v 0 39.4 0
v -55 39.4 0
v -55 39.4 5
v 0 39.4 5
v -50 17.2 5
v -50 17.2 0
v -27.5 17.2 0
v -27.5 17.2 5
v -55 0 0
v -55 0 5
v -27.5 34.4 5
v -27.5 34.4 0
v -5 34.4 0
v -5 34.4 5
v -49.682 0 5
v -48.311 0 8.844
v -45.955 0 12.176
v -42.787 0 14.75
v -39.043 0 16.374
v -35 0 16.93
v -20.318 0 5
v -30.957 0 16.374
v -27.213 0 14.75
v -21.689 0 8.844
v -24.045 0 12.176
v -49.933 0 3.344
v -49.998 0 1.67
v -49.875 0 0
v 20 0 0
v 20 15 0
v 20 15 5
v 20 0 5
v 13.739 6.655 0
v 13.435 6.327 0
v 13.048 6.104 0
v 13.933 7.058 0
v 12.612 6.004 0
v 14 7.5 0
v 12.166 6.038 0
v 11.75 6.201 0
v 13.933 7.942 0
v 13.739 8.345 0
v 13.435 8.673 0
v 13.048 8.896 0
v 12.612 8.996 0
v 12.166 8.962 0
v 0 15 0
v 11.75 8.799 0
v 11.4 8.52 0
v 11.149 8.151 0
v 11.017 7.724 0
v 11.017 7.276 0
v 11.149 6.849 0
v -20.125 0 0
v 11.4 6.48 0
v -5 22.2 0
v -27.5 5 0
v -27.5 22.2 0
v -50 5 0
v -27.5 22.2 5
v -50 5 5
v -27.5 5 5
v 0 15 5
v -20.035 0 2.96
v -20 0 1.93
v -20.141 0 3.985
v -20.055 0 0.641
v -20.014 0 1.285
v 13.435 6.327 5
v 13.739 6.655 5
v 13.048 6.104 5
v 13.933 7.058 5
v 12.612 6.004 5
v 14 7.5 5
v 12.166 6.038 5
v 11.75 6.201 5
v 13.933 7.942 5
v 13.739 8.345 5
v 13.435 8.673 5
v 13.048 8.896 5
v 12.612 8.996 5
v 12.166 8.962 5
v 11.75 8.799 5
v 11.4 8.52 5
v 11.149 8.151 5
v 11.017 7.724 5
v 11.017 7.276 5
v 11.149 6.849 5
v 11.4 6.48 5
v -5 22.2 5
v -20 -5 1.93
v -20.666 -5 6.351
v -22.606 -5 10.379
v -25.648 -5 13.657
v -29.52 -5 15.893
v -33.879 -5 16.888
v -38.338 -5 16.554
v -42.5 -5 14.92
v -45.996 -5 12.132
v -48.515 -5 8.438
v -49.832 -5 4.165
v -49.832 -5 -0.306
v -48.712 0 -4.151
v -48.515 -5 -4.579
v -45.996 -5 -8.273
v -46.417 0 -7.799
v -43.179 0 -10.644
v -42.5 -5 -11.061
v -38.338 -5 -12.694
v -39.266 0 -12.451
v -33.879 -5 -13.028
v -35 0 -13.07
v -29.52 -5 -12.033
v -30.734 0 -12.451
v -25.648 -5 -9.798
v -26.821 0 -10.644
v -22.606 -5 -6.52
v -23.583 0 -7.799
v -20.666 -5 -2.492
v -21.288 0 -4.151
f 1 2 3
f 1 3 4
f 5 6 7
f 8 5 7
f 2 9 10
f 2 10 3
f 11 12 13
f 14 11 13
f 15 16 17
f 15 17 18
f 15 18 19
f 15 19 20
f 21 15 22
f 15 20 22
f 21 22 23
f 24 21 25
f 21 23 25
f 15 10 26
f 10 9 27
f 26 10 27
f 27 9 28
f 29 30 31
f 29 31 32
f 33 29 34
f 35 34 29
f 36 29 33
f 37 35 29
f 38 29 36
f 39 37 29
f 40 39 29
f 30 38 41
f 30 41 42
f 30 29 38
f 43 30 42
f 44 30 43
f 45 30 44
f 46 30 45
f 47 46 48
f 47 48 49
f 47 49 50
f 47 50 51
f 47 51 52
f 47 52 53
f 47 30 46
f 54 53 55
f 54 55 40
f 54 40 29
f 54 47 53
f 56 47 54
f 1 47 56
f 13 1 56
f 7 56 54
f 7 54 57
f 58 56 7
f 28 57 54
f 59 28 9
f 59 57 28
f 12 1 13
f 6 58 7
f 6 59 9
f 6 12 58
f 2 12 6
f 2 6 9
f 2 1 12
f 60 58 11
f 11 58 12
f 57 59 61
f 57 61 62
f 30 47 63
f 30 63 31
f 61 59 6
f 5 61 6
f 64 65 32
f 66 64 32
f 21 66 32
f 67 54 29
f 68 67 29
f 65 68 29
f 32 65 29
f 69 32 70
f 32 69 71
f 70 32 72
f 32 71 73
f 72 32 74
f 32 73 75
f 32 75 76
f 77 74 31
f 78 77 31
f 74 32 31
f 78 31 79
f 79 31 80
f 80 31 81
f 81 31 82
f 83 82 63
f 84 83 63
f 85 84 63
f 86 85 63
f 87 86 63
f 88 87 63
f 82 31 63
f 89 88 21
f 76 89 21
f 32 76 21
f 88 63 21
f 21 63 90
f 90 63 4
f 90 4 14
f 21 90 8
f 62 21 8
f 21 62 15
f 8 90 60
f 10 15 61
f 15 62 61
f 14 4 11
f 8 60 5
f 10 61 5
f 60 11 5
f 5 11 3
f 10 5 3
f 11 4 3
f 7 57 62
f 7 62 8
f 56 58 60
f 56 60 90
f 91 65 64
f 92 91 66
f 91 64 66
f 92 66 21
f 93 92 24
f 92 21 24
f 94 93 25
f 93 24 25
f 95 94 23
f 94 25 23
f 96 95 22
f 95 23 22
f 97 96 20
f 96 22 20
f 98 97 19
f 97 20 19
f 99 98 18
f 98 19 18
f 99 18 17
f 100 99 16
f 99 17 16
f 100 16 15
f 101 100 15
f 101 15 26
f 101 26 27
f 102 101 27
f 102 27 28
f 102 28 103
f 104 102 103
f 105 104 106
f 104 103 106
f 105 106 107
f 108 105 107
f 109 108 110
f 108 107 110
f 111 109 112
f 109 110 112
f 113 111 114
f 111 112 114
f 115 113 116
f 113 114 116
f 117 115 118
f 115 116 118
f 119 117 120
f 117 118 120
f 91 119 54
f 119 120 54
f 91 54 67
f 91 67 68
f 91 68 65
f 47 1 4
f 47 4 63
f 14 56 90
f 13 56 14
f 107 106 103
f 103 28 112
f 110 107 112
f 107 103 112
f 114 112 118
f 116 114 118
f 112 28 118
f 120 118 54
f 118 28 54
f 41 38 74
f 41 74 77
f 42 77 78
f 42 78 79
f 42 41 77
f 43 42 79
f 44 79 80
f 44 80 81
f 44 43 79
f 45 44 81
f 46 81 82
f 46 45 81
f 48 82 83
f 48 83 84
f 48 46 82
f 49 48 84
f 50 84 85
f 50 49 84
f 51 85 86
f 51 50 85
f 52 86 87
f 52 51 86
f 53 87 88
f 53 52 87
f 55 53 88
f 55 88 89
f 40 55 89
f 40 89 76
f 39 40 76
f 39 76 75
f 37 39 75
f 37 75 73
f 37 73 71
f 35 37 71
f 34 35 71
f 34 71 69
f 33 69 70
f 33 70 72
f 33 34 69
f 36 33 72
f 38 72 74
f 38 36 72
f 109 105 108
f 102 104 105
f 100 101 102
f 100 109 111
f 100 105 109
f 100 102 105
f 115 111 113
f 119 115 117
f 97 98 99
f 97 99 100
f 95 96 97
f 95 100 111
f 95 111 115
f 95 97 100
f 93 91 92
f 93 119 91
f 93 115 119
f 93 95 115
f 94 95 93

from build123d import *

# Parameters (mm, degrees)
SKETCH1_R           = 1.5
SKETCH1_W           = 22.5
SKETCH1_H           = 12.2
BOSS_EXTRUDE1_DEPTH = 5
SKETCH2_R           = 15
BOSS_EXTRUDE2_DEPTH = 5


with BuildPart() as part:
    # Sketch1 → Boss-Extrude1 (new body)
    with BuildSketch(Plane.XY):
        Polygon((0, 0), (-55, 0), (-55, 39.4), (0, 39.4), (0, 15), (20, 15), (20, 0), align=None)
        with Locations((12.5, 7.5)):
            Circle(SKETCH1_R, mode=Mode.SUBTRACT)
        with Locations((-38.75, 11.1)):
            Rectangle(SKETCH1_W, SKETCH1_H, mode=Mode.SUBTRACT)
        with Locations((-16.25, 28.3)):
            Rectangle(SKETCH1_W, SKETCH1_H, mode=Mode.SUBTRACT)
    extrude(amount=BOSS_EXTRUDE1_DEPTH)

    # Sketch2 → Boss-Extrude2 (add)
    with BuildSketch(Plane.XZ):
        with Locations((-35, 1.929670276)):
            Circle(SKETCH2_R)
    extrude(amount=BOSS_EXTRUDE2_DEPTH)


solid = part.part
